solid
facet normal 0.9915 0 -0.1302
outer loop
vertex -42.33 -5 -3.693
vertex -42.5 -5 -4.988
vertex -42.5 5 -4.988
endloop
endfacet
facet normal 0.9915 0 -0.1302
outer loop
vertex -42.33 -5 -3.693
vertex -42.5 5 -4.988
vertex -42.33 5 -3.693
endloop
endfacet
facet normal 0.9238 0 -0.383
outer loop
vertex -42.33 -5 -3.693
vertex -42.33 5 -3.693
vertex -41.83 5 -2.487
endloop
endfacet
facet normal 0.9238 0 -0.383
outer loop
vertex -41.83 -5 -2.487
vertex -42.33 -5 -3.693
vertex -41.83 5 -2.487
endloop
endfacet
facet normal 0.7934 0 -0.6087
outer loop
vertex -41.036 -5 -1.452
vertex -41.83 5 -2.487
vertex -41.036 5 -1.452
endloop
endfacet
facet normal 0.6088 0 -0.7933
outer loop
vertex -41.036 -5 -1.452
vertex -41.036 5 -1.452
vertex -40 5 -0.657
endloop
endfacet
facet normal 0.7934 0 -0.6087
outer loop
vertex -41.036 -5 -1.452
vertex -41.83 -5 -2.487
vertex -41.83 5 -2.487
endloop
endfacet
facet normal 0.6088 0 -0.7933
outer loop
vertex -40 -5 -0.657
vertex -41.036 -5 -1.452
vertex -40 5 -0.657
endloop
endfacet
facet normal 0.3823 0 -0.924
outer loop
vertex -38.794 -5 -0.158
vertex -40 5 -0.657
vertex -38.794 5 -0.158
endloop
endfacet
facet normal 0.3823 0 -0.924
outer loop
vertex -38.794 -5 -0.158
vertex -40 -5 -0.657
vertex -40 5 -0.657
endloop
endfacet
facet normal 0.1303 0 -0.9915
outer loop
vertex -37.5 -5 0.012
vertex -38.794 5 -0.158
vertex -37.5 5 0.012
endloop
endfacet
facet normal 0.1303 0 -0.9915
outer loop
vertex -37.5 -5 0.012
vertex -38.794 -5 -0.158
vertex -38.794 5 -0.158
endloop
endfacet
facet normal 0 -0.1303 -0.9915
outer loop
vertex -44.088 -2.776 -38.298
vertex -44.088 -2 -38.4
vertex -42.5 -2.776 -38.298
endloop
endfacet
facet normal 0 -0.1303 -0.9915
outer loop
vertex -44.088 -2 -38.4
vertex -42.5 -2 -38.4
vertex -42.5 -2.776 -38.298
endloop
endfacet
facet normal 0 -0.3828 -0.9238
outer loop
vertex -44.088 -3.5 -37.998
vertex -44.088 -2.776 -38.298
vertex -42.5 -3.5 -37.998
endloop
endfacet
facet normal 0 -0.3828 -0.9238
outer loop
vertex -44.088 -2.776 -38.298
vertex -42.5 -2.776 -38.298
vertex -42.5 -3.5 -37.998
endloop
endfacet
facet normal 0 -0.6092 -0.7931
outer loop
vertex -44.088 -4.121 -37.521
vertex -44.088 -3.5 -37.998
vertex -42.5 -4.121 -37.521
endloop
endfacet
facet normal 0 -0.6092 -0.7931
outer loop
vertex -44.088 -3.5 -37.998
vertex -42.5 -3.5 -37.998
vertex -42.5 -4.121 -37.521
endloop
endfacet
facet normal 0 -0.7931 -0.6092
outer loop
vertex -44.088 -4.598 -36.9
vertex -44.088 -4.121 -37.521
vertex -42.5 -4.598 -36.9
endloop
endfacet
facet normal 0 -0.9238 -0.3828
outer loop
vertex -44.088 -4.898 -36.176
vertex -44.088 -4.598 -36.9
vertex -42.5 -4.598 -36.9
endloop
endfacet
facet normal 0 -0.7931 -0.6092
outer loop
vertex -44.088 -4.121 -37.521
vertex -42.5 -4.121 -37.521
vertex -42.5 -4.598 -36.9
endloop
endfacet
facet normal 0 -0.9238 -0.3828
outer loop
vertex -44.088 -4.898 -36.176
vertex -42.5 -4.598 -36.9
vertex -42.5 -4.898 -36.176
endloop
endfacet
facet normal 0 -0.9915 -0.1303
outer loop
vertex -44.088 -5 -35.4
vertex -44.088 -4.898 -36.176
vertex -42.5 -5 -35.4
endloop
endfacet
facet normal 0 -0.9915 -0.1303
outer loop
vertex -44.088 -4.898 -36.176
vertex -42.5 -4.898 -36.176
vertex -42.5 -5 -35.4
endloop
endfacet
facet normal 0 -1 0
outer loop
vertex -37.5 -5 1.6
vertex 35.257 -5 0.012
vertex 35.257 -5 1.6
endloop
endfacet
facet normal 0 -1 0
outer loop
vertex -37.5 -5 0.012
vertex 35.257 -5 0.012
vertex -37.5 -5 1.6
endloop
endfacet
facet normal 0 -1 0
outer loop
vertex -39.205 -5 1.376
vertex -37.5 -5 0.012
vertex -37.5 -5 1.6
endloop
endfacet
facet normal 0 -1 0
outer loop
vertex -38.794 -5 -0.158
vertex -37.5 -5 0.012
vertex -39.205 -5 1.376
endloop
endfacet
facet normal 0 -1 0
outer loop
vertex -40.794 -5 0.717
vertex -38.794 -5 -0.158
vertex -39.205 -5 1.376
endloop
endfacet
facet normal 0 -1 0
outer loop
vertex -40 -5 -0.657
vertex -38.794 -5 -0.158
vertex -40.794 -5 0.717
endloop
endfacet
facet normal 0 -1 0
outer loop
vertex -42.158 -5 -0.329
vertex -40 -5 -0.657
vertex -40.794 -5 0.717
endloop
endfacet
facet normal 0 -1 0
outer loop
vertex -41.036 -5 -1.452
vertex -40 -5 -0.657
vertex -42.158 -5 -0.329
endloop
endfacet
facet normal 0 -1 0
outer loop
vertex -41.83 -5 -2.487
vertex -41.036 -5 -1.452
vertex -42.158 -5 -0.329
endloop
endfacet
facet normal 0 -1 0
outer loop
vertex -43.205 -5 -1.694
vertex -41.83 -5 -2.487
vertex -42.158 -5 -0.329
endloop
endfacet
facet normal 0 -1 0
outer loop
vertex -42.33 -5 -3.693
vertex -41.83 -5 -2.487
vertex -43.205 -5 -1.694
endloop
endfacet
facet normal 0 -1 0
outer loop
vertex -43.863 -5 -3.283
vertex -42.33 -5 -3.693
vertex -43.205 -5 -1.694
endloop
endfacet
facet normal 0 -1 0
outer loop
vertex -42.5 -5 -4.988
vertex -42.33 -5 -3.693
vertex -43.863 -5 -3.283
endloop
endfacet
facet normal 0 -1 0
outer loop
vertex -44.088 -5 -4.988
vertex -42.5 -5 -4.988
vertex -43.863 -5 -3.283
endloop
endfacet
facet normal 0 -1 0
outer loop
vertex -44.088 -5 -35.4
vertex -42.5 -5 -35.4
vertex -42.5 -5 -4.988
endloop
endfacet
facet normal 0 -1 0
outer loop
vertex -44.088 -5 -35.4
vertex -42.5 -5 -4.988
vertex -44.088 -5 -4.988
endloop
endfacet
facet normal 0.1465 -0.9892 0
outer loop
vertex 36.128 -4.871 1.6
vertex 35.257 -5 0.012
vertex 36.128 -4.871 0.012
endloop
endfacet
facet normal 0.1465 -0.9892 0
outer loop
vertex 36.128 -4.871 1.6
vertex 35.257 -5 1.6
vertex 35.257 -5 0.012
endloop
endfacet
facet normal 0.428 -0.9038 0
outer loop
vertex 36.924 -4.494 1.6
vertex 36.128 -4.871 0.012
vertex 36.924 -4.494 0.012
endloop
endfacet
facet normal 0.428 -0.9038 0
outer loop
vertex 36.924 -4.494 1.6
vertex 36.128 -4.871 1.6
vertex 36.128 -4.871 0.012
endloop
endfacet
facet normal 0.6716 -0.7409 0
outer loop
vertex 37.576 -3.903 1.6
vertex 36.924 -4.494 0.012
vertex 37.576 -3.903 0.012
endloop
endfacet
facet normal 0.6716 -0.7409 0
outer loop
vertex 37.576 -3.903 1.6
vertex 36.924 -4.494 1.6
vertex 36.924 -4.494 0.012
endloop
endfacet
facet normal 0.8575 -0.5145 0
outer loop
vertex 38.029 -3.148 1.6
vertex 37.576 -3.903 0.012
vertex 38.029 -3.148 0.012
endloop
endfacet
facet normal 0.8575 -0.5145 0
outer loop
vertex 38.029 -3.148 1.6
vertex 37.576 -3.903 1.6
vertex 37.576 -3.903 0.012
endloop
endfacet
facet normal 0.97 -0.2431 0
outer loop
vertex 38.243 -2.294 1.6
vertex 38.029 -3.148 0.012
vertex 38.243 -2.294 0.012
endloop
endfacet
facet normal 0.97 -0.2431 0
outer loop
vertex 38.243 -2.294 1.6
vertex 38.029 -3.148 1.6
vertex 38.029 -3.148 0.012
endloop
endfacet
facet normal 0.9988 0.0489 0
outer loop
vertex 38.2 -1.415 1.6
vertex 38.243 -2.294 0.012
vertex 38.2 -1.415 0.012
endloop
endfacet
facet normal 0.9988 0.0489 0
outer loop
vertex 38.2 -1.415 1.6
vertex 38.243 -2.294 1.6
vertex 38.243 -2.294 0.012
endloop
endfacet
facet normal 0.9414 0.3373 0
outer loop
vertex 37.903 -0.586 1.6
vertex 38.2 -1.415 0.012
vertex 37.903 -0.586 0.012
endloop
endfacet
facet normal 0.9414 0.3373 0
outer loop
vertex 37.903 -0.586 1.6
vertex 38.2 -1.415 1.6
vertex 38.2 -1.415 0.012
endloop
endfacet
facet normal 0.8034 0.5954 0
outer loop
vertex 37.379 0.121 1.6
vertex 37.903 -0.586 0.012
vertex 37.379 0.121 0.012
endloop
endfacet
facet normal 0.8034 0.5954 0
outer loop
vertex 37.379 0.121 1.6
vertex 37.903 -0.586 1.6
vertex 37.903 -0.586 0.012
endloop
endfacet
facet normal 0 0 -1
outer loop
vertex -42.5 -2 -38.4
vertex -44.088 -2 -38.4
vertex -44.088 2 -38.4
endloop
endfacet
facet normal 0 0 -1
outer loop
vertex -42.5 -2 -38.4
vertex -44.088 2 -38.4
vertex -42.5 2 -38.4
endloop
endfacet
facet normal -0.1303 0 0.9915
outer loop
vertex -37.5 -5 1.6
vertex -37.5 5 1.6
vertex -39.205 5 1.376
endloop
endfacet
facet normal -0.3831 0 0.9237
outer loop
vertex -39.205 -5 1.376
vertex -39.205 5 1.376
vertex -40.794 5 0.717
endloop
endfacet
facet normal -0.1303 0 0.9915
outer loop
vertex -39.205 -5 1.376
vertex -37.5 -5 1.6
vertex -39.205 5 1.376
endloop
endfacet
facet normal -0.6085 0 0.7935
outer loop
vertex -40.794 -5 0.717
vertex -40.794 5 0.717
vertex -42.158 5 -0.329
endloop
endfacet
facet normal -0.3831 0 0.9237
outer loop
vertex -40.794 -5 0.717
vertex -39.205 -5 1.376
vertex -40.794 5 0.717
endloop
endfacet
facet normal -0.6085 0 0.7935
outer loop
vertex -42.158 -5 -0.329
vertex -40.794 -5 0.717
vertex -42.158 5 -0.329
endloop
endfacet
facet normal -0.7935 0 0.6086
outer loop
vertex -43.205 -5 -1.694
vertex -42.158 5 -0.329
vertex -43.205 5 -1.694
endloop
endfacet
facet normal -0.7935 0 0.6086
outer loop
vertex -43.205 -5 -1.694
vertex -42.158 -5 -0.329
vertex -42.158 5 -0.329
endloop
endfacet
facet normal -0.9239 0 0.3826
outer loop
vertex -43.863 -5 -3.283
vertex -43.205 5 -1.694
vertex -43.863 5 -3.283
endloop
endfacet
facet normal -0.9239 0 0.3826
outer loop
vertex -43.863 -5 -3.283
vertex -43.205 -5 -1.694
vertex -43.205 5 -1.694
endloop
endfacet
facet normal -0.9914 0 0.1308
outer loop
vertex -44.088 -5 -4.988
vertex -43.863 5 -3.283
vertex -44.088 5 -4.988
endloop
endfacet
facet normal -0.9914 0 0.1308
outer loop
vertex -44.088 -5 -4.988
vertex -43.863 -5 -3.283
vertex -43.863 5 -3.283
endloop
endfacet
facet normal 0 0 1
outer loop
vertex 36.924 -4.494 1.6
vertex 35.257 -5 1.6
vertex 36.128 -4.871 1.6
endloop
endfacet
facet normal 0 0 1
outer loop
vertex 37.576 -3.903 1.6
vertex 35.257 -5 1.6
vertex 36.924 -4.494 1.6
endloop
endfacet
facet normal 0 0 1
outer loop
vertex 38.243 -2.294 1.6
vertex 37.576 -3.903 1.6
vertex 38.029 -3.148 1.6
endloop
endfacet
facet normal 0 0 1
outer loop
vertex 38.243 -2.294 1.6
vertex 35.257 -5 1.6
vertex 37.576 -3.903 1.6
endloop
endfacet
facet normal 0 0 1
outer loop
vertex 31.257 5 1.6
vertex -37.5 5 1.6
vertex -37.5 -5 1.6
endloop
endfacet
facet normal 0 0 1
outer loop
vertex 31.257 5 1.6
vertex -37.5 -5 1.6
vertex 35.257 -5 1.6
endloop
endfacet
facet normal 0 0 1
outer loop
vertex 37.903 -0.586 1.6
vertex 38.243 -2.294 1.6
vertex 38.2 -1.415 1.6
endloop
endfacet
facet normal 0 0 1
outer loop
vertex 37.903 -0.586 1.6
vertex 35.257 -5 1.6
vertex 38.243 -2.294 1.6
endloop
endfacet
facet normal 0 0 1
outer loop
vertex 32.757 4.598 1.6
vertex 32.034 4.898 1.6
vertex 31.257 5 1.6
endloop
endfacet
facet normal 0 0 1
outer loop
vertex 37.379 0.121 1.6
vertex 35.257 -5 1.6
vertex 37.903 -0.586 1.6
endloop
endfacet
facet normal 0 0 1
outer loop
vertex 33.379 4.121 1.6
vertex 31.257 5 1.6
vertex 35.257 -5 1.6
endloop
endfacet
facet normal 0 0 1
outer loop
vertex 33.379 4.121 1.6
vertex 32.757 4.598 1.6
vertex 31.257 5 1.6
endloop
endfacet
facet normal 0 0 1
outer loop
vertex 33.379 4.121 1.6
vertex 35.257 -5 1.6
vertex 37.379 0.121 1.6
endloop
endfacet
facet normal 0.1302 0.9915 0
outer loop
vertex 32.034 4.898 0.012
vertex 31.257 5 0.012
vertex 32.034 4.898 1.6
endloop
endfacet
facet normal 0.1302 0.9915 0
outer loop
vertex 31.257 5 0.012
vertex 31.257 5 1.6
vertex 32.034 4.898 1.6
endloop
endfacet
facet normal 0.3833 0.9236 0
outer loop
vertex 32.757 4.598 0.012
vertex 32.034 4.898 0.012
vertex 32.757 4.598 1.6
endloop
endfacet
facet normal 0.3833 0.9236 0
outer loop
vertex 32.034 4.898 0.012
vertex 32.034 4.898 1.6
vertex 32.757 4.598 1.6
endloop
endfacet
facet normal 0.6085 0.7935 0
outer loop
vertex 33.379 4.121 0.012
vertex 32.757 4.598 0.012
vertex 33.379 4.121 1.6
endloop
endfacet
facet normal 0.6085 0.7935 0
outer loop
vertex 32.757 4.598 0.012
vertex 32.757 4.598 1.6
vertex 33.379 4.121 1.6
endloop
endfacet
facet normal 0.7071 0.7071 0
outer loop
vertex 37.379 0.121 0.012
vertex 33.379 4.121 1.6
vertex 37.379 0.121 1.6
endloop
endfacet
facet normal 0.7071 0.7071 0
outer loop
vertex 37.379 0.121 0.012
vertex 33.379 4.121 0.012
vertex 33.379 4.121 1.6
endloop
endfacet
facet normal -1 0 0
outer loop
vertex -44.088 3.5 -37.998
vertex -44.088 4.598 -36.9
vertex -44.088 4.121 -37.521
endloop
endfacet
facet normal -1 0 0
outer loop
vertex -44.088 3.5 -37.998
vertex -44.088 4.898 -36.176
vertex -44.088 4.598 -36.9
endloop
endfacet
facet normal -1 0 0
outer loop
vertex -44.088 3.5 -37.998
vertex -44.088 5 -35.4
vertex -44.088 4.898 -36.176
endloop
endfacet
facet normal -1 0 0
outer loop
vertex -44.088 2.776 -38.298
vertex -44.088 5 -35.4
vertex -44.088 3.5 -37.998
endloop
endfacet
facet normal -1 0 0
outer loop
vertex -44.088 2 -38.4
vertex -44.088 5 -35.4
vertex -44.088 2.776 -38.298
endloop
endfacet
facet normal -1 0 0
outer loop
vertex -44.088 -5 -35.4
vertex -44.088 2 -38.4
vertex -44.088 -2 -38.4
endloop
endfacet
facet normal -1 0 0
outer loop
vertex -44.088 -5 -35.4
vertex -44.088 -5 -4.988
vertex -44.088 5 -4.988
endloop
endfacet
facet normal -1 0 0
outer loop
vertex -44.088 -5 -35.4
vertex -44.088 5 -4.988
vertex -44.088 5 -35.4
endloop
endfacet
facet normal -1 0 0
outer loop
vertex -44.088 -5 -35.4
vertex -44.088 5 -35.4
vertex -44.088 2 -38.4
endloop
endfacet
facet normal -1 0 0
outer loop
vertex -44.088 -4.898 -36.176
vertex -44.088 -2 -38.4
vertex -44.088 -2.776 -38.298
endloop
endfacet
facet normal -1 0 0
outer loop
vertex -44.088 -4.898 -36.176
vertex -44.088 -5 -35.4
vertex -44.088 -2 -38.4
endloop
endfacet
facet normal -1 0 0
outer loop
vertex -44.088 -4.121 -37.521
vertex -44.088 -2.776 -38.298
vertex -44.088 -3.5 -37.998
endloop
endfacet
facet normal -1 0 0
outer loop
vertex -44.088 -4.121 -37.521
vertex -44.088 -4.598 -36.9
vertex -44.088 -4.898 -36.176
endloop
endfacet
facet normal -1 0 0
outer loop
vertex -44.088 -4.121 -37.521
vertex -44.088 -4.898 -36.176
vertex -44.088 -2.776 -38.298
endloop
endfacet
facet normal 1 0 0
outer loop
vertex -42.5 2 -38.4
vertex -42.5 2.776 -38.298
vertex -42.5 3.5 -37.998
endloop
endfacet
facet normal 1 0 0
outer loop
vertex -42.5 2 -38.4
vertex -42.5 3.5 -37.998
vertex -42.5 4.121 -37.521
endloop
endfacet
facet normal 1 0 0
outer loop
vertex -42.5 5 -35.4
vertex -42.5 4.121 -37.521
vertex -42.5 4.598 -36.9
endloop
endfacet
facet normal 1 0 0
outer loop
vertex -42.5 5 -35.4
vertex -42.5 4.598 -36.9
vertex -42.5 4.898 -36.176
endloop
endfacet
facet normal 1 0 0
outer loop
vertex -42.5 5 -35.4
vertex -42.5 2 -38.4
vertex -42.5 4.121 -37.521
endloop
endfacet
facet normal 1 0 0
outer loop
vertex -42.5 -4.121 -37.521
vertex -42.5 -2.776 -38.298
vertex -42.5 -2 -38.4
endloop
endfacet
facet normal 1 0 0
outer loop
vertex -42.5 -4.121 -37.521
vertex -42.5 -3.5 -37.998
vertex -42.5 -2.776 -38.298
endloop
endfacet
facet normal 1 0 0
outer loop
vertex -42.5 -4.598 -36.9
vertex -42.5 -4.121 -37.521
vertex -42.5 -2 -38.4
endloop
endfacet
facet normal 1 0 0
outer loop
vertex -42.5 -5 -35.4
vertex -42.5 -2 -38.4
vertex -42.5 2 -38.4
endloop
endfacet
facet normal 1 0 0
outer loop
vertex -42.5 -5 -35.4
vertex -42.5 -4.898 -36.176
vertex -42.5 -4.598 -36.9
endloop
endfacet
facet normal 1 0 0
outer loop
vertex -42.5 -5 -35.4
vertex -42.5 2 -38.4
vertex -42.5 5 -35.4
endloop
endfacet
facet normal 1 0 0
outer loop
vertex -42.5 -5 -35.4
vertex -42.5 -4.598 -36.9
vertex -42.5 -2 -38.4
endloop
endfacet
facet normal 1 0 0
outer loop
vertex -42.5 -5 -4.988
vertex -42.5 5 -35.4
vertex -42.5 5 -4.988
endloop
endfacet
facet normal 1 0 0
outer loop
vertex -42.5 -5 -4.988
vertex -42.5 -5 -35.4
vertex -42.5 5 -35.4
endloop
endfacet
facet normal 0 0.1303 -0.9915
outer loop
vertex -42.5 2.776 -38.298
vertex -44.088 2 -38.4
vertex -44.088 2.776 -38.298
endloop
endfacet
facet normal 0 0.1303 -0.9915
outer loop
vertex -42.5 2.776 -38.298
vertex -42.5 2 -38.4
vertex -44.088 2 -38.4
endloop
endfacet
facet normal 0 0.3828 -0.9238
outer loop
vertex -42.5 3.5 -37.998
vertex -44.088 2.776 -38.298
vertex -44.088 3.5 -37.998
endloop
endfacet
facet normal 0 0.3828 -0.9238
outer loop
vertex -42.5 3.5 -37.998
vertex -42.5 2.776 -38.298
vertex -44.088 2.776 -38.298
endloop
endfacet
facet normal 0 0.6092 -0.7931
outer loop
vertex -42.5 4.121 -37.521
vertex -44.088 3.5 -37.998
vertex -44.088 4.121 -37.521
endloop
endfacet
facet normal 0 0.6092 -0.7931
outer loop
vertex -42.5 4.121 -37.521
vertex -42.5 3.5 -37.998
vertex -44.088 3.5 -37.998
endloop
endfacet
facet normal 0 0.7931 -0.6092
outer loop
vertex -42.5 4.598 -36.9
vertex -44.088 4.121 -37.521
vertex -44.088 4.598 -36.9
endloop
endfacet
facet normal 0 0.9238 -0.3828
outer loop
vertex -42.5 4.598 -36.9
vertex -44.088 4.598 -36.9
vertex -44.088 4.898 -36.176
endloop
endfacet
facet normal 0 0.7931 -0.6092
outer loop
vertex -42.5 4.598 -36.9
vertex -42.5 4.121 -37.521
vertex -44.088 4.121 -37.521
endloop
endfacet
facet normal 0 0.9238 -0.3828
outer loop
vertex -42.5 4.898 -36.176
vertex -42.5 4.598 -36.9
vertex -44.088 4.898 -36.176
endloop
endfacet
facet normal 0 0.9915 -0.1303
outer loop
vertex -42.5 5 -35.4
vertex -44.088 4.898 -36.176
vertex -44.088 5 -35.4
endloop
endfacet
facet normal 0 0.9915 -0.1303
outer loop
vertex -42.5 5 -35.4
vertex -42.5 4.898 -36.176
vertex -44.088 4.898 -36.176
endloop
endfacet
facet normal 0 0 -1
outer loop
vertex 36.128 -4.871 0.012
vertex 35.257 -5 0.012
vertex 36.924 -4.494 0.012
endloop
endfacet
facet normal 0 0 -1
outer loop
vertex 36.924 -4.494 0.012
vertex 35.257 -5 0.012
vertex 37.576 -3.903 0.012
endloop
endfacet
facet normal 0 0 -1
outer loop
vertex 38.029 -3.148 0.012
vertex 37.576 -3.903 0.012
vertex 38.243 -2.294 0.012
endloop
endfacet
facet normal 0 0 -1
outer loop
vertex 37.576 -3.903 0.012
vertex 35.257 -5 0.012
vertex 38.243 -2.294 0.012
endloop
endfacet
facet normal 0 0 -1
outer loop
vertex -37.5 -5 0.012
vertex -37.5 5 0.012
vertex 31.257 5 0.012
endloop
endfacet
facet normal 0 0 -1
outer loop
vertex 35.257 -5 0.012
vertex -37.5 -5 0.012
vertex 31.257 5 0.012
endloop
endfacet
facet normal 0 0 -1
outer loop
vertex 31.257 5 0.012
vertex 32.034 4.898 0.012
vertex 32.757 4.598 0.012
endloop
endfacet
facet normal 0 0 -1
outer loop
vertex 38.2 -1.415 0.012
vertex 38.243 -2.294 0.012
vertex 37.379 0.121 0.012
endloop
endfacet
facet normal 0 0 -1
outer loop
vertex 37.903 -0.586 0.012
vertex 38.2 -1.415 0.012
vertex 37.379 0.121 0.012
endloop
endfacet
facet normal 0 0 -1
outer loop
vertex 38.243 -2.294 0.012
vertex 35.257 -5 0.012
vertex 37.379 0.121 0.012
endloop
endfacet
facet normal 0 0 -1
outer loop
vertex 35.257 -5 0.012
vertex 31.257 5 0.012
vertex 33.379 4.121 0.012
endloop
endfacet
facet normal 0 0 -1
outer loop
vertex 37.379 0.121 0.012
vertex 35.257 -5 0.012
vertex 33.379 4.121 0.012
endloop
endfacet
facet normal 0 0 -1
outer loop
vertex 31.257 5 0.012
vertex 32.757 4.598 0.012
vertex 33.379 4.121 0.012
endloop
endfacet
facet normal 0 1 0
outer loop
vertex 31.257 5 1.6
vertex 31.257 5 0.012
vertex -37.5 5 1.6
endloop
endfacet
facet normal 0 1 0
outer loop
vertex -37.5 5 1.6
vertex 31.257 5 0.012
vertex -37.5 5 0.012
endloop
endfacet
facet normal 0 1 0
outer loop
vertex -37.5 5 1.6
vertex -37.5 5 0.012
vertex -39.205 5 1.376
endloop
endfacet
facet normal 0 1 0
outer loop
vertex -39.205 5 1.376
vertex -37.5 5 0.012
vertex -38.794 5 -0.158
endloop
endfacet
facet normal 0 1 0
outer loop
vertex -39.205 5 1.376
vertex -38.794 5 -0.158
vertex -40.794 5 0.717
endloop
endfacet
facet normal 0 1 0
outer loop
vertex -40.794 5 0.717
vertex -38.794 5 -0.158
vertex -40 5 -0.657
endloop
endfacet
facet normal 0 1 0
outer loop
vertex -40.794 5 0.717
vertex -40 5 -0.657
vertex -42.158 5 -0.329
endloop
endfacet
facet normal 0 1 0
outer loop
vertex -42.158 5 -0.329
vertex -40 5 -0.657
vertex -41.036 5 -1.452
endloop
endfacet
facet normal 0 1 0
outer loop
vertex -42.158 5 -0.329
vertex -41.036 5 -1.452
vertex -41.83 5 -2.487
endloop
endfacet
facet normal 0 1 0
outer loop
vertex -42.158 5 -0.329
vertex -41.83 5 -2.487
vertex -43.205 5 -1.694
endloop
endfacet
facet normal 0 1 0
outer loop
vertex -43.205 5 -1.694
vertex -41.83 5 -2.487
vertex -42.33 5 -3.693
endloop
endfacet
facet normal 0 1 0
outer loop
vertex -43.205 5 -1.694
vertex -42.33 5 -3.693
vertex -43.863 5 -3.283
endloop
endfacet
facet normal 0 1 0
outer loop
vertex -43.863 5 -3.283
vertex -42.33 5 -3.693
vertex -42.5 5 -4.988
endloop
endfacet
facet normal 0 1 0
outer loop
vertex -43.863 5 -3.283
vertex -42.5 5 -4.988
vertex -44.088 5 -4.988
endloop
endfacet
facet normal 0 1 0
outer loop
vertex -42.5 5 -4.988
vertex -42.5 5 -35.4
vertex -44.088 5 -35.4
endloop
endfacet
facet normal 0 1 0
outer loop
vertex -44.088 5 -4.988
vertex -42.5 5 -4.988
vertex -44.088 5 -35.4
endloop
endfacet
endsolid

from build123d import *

# Parameters (mm, degrees)
SKETCH1_W                    = 85
SKETCH1_H                    = 10
BOSS_EXTRUDE1_DEPTH          = 1.6
CUT_EXTRUDE1_DEPTH           = 43.823007835
CUT_EXTRUDE1_DEPTH_BACK      = 10
CONVERT_SOLID1_DEPTH         = 0.0125
EDGE_FLANGE1_STRIP_W         = 16.35
EDGE_FLANGE1_STRIP_H         = 1.5875
EDGE_FLANGE1_STRIP_CUT_DEPTH = 10
EDGE_FLANGE1_DEPTH           = 10
FILLET2_R                    = 3


# Read off the part's stored shape, not the designer's step: Convert-Solid1
# Sheet-metal steps are written as plain solids
with BuildPart() as part:
    # Sketch1 → Boss-Extrude1 (new body)
    with BuildSketch(Plane.XY):
        Rectangle(SKETCH1_W, SKETCH1_H)
    extrude(amount=BOSS_EXTRUDE1_DEPTH)

    # Sketch2 → Cut-Extrude1 (cut, two sides: drawn at the far end of the back side and taken through both)
    with BuildSketch(Plane.XY.offset(1.6).offset(-CUT_EXTRUDE1_DEPTH_BACK)):
        Polygon((32.5, 5), (42.5, -5), (42.5, 5), align=None)
    extrude(amount=CUT_EXTRUDE1_DEPTH + CUT_EXTRUDE1_DEPTH_BACK, mode=Mode.SUBTRACT)

    # Convert-Solid1 outline → Convert-Solid1 (cut)
    with BuildSketch(Plane.XY):
        Polygon((32.5, 5), (-42.5, 5), (-42.5, -5), (42.5, -5), align=None)
    extrude(amount=CONVERT_SOLID1_DEPTH, mode=Mode.SUBTRACT)

    # Edge-Flange1 strip (across the edge) → Edge-Flange1 strip cut (cut)
    with BuildSketch(Plane(origin=(-42.5, -5, 0.0125), x_dir=(1, 0, 0), z_dir=(0, 1, 0))):
        with Locations((-3.175, -0.79375)):
            Rectangle(EDGE_FLANGE1_STRIP_W, EDGE_FLANGE1_STRIP_H)
    extrude(amount=EDGE_FLANGE1_STRIP_CUT_DEPTH, mode=Mode.SUBTRACT)

    # Edge-Flange1 section (across the edge) → Edge-Flange1 (add)
    with BuildSketch(Plane(origin=(-42.5, -5, 0.0125), x_dir=(1, 0, 0), z_dir=(0, 1, 0))):
        with BuildLine():
            Line((-1.5875, 5), (-1.5875, 38.4125))
            Line((-1.5875, 38.4125), (0, 38.4125))
            Line((0, 38.4125), (0, 5))
            ThreePointArc((0, 5), (1.464466094, 1.464466094), (5, 0))
            Line((5, 0), (5, -1.5875))
            ThreePointArc((5, -1.5875), (0.341934079, 0.341934079), (-1.5875, 5))
        make_face()
    extrude(amount=EDGE_FLANGE1_DEPTH)

    # Fillet2
    fillet2_edges = [part.edges().sort_by_distance(p)[0] for p in [
        (-43.29375, -5, -38.4),
        (-43.29375, 5, -38.4),
        (42.5, -5, 0.80625),
        (32.5, 5, 0.80625),
    ]]
    fillet(fillet2_edges, radius=FILLET2_R)


solid = part.part
